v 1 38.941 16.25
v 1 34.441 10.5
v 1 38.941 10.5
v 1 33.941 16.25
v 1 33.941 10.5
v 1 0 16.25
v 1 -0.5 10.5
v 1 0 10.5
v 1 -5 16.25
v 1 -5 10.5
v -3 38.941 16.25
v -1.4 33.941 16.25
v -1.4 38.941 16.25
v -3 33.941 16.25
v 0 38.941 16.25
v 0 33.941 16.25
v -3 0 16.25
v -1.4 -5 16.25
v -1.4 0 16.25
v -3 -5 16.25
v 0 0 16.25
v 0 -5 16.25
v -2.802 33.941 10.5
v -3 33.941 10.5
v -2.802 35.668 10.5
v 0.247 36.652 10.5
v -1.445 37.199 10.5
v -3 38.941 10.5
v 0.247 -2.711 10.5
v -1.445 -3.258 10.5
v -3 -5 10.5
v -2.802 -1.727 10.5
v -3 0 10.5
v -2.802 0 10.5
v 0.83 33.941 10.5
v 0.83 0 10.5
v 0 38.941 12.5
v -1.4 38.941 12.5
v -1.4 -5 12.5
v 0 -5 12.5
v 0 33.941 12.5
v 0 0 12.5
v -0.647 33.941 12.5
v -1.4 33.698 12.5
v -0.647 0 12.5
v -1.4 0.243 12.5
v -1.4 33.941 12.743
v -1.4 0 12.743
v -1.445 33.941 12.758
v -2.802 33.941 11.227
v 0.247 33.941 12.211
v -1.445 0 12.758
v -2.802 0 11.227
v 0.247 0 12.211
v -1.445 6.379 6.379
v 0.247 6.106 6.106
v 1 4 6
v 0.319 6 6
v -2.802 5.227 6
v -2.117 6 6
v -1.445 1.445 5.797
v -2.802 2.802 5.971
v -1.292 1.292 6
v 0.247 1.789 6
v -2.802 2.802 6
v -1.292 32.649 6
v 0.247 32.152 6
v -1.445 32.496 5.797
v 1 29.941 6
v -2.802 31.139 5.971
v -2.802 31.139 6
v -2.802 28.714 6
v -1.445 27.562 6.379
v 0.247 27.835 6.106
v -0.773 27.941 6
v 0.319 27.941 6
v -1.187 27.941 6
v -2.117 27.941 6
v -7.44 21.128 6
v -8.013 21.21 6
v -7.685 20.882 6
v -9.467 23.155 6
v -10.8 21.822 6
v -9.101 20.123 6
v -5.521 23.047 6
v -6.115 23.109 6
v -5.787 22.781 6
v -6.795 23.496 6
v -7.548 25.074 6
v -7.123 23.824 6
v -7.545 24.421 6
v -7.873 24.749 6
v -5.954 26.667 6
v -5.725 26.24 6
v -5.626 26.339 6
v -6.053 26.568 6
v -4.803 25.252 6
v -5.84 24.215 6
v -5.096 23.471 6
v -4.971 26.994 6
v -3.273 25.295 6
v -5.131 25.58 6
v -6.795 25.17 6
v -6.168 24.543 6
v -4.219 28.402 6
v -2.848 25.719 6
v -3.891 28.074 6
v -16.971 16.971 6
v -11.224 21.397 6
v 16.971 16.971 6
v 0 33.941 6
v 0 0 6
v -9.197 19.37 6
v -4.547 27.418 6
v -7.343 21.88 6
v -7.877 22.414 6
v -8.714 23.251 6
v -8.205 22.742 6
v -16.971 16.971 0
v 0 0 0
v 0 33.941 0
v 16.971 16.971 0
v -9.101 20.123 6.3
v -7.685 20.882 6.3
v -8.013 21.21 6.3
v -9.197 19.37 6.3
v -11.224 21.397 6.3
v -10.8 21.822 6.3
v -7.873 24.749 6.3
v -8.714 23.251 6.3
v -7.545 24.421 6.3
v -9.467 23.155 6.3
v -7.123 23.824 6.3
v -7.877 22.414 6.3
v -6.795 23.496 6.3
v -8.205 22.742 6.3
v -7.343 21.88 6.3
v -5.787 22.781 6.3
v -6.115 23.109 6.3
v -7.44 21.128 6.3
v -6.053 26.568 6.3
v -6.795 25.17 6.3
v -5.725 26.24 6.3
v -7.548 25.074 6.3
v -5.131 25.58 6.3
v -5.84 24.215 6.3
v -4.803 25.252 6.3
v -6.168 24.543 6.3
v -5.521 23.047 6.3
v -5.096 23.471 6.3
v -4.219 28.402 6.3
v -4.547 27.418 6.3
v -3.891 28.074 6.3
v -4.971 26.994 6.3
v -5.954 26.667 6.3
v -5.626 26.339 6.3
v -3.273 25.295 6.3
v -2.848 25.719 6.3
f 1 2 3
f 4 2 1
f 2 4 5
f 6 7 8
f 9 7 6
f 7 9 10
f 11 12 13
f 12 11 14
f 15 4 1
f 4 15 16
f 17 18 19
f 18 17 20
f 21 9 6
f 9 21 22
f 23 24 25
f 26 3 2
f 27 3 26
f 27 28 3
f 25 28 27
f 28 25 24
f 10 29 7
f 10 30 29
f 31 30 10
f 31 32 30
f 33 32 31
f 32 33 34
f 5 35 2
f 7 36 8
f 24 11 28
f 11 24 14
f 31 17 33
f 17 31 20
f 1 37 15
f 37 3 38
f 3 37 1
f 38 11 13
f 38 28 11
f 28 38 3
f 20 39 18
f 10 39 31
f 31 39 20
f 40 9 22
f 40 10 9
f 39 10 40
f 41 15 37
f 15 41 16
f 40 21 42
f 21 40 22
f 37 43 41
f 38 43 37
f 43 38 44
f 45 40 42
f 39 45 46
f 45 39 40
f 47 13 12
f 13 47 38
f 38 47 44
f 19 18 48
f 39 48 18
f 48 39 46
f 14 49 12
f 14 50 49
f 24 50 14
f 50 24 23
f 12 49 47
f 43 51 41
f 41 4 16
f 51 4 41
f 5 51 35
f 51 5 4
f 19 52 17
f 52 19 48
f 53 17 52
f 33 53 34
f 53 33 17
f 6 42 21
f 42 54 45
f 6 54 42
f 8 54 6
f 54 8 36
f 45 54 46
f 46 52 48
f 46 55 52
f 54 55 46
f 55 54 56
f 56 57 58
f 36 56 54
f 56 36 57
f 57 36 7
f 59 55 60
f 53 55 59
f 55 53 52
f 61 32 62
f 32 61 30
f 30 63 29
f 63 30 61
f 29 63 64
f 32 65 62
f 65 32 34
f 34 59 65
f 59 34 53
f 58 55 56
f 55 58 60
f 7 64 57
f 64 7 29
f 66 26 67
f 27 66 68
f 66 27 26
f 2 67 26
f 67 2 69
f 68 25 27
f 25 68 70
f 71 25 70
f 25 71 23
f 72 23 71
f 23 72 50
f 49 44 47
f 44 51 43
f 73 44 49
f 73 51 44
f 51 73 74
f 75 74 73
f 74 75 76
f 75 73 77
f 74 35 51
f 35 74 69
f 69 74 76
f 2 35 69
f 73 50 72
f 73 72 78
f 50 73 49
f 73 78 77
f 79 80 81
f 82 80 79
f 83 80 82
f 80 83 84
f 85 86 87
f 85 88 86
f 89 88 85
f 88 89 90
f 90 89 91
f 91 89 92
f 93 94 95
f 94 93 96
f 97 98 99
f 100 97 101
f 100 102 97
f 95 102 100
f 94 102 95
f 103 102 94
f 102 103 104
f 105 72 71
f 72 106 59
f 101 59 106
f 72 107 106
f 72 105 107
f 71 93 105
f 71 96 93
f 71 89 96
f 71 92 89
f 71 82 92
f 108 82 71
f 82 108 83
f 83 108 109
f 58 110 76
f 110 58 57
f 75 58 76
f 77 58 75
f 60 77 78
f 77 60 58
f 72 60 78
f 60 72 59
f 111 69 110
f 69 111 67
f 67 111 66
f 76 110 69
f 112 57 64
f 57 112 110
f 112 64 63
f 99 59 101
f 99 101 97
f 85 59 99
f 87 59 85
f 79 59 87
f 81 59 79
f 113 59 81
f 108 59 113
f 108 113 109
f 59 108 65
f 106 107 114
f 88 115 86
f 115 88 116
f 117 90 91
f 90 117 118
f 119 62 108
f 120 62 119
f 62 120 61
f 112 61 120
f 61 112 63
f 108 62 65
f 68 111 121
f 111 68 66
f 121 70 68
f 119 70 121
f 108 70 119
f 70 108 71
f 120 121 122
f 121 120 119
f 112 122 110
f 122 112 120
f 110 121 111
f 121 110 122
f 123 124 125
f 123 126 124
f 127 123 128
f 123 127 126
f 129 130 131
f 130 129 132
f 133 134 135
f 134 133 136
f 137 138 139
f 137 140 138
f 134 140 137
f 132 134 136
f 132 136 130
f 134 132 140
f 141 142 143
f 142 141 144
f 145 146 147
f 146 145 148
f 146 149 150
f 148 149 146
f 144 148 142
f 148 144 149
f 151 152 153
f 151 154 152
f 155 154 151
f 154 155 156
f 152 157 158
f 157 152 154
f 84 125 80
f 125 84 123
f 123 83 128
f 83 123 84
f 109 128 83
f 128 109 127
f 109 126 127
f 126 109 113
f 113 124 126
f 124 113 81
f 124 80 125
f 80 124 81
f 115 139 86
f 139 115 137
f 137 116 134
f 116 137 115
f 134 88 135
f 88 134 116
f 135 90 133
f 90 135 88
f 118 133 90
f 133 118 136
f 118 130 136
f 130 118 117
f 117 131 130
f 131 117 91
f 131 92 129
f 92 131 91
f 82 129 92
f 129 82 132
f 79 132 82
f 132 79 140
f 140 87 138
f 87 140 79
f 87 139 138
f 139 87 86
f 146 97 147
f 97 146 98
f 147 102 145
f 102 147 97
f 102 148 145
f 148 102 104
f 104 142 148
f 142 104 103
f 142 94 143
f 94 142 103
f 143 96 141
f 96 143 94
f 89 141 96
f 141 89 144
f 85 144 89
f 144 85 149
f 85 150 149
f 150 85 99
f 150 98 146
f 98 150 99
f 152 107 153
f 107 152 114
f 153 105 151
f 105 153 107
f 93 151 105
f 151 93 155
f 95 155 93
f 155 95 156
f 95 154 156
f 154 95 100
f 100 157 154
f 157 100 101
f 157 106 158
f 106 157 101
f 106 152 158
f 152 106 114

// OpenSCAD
// Microscope slide holder for RF-6000 Spectrofluorophotometer

// Units are mm
// Parameters
slide_depth = 1; // Thickness of slide
stage_bottom = 12.5; // location of start of cut, 
//slide_bottom = 8.5; // where slide will rest
slide_width = 25; // in this case, it will be the height, slides are about 25 mm wide, but larger will allow the slide to move around
stage_thick = 2; // how thick the stage bottom layer is

post_width = 24; // square base
post_height = 6;
arm_height = stage_thick+(0.15*slide_width);

shroud_thickness = 3;
notch = 5;

tolerance = 0.2; // for gaps to allow slide to pass

// Derived parameters
hypotenuse = ((2*(post_width^2))^(0.5));

union() {
    // Mounting Post
    translate([0, 0, 0])
    rotate([0,0,45])
    cube([post_width, post_width, post_height]);
        
    difference() {
        // Stage
        rotate([0, 0, 0])
        translate([-3*slide_depth, -5, stage_bottom-stage_thick])
        cube([4*slide_depth, 5+hypotenuse+5, arm_height]);
        
        // Cutting out the stage
        rotate([0,0,0])
        translate([-slide_depth-(2*tolerance),-5-1,stage_bottom])
        cube([slide_depth+(2*tolerance),6+hypotenuse+6,(tolerance+slide_width)]); // leading +1 are for extra
        
        // Cutting out the viewing area
        translate([-post_width/2, 0, post_height])
        cube([post_width, hypotenuse, hypotenuse]);
    };
    difference(){
        union(){
            // Support post
            translate([-slide_depth, 5*slide_depth, post_height-1])
            rotate([45, 0, 0])
            cylinder(h = (1+stage_bottom-post_height)/sin(45), r = 2*slide_depth);
    
            // Support post
            translate([-slide_depth, hypotenuse-(5*slide_depth), post_height-1])
            rotate([315, 0, 0])
            cylinder(h = (1+stage_bottom-post_height)/sin(45), r = 2*slide_depth);
        };
        // Cutting out the stage... again
        rotate([0,0,0])
        translate([-slide_depth-(2*tolerance),-5-1,stage_bottom])
        cube([slide_depth+(2*tolerance),6+hypotenuse+6,(tolerance+slide_width)]); // leading +1 are for extra
    };
    
    // Label back
    rotate([0, 0, 45])
    translate([0.5*post_width, 0.9*post_width, post_height])
    linear_extrude(height = 0.3)
    text("LEFT", size = 3, font = "Arial:style=Bold", halign = "center", valign = "center");
}
